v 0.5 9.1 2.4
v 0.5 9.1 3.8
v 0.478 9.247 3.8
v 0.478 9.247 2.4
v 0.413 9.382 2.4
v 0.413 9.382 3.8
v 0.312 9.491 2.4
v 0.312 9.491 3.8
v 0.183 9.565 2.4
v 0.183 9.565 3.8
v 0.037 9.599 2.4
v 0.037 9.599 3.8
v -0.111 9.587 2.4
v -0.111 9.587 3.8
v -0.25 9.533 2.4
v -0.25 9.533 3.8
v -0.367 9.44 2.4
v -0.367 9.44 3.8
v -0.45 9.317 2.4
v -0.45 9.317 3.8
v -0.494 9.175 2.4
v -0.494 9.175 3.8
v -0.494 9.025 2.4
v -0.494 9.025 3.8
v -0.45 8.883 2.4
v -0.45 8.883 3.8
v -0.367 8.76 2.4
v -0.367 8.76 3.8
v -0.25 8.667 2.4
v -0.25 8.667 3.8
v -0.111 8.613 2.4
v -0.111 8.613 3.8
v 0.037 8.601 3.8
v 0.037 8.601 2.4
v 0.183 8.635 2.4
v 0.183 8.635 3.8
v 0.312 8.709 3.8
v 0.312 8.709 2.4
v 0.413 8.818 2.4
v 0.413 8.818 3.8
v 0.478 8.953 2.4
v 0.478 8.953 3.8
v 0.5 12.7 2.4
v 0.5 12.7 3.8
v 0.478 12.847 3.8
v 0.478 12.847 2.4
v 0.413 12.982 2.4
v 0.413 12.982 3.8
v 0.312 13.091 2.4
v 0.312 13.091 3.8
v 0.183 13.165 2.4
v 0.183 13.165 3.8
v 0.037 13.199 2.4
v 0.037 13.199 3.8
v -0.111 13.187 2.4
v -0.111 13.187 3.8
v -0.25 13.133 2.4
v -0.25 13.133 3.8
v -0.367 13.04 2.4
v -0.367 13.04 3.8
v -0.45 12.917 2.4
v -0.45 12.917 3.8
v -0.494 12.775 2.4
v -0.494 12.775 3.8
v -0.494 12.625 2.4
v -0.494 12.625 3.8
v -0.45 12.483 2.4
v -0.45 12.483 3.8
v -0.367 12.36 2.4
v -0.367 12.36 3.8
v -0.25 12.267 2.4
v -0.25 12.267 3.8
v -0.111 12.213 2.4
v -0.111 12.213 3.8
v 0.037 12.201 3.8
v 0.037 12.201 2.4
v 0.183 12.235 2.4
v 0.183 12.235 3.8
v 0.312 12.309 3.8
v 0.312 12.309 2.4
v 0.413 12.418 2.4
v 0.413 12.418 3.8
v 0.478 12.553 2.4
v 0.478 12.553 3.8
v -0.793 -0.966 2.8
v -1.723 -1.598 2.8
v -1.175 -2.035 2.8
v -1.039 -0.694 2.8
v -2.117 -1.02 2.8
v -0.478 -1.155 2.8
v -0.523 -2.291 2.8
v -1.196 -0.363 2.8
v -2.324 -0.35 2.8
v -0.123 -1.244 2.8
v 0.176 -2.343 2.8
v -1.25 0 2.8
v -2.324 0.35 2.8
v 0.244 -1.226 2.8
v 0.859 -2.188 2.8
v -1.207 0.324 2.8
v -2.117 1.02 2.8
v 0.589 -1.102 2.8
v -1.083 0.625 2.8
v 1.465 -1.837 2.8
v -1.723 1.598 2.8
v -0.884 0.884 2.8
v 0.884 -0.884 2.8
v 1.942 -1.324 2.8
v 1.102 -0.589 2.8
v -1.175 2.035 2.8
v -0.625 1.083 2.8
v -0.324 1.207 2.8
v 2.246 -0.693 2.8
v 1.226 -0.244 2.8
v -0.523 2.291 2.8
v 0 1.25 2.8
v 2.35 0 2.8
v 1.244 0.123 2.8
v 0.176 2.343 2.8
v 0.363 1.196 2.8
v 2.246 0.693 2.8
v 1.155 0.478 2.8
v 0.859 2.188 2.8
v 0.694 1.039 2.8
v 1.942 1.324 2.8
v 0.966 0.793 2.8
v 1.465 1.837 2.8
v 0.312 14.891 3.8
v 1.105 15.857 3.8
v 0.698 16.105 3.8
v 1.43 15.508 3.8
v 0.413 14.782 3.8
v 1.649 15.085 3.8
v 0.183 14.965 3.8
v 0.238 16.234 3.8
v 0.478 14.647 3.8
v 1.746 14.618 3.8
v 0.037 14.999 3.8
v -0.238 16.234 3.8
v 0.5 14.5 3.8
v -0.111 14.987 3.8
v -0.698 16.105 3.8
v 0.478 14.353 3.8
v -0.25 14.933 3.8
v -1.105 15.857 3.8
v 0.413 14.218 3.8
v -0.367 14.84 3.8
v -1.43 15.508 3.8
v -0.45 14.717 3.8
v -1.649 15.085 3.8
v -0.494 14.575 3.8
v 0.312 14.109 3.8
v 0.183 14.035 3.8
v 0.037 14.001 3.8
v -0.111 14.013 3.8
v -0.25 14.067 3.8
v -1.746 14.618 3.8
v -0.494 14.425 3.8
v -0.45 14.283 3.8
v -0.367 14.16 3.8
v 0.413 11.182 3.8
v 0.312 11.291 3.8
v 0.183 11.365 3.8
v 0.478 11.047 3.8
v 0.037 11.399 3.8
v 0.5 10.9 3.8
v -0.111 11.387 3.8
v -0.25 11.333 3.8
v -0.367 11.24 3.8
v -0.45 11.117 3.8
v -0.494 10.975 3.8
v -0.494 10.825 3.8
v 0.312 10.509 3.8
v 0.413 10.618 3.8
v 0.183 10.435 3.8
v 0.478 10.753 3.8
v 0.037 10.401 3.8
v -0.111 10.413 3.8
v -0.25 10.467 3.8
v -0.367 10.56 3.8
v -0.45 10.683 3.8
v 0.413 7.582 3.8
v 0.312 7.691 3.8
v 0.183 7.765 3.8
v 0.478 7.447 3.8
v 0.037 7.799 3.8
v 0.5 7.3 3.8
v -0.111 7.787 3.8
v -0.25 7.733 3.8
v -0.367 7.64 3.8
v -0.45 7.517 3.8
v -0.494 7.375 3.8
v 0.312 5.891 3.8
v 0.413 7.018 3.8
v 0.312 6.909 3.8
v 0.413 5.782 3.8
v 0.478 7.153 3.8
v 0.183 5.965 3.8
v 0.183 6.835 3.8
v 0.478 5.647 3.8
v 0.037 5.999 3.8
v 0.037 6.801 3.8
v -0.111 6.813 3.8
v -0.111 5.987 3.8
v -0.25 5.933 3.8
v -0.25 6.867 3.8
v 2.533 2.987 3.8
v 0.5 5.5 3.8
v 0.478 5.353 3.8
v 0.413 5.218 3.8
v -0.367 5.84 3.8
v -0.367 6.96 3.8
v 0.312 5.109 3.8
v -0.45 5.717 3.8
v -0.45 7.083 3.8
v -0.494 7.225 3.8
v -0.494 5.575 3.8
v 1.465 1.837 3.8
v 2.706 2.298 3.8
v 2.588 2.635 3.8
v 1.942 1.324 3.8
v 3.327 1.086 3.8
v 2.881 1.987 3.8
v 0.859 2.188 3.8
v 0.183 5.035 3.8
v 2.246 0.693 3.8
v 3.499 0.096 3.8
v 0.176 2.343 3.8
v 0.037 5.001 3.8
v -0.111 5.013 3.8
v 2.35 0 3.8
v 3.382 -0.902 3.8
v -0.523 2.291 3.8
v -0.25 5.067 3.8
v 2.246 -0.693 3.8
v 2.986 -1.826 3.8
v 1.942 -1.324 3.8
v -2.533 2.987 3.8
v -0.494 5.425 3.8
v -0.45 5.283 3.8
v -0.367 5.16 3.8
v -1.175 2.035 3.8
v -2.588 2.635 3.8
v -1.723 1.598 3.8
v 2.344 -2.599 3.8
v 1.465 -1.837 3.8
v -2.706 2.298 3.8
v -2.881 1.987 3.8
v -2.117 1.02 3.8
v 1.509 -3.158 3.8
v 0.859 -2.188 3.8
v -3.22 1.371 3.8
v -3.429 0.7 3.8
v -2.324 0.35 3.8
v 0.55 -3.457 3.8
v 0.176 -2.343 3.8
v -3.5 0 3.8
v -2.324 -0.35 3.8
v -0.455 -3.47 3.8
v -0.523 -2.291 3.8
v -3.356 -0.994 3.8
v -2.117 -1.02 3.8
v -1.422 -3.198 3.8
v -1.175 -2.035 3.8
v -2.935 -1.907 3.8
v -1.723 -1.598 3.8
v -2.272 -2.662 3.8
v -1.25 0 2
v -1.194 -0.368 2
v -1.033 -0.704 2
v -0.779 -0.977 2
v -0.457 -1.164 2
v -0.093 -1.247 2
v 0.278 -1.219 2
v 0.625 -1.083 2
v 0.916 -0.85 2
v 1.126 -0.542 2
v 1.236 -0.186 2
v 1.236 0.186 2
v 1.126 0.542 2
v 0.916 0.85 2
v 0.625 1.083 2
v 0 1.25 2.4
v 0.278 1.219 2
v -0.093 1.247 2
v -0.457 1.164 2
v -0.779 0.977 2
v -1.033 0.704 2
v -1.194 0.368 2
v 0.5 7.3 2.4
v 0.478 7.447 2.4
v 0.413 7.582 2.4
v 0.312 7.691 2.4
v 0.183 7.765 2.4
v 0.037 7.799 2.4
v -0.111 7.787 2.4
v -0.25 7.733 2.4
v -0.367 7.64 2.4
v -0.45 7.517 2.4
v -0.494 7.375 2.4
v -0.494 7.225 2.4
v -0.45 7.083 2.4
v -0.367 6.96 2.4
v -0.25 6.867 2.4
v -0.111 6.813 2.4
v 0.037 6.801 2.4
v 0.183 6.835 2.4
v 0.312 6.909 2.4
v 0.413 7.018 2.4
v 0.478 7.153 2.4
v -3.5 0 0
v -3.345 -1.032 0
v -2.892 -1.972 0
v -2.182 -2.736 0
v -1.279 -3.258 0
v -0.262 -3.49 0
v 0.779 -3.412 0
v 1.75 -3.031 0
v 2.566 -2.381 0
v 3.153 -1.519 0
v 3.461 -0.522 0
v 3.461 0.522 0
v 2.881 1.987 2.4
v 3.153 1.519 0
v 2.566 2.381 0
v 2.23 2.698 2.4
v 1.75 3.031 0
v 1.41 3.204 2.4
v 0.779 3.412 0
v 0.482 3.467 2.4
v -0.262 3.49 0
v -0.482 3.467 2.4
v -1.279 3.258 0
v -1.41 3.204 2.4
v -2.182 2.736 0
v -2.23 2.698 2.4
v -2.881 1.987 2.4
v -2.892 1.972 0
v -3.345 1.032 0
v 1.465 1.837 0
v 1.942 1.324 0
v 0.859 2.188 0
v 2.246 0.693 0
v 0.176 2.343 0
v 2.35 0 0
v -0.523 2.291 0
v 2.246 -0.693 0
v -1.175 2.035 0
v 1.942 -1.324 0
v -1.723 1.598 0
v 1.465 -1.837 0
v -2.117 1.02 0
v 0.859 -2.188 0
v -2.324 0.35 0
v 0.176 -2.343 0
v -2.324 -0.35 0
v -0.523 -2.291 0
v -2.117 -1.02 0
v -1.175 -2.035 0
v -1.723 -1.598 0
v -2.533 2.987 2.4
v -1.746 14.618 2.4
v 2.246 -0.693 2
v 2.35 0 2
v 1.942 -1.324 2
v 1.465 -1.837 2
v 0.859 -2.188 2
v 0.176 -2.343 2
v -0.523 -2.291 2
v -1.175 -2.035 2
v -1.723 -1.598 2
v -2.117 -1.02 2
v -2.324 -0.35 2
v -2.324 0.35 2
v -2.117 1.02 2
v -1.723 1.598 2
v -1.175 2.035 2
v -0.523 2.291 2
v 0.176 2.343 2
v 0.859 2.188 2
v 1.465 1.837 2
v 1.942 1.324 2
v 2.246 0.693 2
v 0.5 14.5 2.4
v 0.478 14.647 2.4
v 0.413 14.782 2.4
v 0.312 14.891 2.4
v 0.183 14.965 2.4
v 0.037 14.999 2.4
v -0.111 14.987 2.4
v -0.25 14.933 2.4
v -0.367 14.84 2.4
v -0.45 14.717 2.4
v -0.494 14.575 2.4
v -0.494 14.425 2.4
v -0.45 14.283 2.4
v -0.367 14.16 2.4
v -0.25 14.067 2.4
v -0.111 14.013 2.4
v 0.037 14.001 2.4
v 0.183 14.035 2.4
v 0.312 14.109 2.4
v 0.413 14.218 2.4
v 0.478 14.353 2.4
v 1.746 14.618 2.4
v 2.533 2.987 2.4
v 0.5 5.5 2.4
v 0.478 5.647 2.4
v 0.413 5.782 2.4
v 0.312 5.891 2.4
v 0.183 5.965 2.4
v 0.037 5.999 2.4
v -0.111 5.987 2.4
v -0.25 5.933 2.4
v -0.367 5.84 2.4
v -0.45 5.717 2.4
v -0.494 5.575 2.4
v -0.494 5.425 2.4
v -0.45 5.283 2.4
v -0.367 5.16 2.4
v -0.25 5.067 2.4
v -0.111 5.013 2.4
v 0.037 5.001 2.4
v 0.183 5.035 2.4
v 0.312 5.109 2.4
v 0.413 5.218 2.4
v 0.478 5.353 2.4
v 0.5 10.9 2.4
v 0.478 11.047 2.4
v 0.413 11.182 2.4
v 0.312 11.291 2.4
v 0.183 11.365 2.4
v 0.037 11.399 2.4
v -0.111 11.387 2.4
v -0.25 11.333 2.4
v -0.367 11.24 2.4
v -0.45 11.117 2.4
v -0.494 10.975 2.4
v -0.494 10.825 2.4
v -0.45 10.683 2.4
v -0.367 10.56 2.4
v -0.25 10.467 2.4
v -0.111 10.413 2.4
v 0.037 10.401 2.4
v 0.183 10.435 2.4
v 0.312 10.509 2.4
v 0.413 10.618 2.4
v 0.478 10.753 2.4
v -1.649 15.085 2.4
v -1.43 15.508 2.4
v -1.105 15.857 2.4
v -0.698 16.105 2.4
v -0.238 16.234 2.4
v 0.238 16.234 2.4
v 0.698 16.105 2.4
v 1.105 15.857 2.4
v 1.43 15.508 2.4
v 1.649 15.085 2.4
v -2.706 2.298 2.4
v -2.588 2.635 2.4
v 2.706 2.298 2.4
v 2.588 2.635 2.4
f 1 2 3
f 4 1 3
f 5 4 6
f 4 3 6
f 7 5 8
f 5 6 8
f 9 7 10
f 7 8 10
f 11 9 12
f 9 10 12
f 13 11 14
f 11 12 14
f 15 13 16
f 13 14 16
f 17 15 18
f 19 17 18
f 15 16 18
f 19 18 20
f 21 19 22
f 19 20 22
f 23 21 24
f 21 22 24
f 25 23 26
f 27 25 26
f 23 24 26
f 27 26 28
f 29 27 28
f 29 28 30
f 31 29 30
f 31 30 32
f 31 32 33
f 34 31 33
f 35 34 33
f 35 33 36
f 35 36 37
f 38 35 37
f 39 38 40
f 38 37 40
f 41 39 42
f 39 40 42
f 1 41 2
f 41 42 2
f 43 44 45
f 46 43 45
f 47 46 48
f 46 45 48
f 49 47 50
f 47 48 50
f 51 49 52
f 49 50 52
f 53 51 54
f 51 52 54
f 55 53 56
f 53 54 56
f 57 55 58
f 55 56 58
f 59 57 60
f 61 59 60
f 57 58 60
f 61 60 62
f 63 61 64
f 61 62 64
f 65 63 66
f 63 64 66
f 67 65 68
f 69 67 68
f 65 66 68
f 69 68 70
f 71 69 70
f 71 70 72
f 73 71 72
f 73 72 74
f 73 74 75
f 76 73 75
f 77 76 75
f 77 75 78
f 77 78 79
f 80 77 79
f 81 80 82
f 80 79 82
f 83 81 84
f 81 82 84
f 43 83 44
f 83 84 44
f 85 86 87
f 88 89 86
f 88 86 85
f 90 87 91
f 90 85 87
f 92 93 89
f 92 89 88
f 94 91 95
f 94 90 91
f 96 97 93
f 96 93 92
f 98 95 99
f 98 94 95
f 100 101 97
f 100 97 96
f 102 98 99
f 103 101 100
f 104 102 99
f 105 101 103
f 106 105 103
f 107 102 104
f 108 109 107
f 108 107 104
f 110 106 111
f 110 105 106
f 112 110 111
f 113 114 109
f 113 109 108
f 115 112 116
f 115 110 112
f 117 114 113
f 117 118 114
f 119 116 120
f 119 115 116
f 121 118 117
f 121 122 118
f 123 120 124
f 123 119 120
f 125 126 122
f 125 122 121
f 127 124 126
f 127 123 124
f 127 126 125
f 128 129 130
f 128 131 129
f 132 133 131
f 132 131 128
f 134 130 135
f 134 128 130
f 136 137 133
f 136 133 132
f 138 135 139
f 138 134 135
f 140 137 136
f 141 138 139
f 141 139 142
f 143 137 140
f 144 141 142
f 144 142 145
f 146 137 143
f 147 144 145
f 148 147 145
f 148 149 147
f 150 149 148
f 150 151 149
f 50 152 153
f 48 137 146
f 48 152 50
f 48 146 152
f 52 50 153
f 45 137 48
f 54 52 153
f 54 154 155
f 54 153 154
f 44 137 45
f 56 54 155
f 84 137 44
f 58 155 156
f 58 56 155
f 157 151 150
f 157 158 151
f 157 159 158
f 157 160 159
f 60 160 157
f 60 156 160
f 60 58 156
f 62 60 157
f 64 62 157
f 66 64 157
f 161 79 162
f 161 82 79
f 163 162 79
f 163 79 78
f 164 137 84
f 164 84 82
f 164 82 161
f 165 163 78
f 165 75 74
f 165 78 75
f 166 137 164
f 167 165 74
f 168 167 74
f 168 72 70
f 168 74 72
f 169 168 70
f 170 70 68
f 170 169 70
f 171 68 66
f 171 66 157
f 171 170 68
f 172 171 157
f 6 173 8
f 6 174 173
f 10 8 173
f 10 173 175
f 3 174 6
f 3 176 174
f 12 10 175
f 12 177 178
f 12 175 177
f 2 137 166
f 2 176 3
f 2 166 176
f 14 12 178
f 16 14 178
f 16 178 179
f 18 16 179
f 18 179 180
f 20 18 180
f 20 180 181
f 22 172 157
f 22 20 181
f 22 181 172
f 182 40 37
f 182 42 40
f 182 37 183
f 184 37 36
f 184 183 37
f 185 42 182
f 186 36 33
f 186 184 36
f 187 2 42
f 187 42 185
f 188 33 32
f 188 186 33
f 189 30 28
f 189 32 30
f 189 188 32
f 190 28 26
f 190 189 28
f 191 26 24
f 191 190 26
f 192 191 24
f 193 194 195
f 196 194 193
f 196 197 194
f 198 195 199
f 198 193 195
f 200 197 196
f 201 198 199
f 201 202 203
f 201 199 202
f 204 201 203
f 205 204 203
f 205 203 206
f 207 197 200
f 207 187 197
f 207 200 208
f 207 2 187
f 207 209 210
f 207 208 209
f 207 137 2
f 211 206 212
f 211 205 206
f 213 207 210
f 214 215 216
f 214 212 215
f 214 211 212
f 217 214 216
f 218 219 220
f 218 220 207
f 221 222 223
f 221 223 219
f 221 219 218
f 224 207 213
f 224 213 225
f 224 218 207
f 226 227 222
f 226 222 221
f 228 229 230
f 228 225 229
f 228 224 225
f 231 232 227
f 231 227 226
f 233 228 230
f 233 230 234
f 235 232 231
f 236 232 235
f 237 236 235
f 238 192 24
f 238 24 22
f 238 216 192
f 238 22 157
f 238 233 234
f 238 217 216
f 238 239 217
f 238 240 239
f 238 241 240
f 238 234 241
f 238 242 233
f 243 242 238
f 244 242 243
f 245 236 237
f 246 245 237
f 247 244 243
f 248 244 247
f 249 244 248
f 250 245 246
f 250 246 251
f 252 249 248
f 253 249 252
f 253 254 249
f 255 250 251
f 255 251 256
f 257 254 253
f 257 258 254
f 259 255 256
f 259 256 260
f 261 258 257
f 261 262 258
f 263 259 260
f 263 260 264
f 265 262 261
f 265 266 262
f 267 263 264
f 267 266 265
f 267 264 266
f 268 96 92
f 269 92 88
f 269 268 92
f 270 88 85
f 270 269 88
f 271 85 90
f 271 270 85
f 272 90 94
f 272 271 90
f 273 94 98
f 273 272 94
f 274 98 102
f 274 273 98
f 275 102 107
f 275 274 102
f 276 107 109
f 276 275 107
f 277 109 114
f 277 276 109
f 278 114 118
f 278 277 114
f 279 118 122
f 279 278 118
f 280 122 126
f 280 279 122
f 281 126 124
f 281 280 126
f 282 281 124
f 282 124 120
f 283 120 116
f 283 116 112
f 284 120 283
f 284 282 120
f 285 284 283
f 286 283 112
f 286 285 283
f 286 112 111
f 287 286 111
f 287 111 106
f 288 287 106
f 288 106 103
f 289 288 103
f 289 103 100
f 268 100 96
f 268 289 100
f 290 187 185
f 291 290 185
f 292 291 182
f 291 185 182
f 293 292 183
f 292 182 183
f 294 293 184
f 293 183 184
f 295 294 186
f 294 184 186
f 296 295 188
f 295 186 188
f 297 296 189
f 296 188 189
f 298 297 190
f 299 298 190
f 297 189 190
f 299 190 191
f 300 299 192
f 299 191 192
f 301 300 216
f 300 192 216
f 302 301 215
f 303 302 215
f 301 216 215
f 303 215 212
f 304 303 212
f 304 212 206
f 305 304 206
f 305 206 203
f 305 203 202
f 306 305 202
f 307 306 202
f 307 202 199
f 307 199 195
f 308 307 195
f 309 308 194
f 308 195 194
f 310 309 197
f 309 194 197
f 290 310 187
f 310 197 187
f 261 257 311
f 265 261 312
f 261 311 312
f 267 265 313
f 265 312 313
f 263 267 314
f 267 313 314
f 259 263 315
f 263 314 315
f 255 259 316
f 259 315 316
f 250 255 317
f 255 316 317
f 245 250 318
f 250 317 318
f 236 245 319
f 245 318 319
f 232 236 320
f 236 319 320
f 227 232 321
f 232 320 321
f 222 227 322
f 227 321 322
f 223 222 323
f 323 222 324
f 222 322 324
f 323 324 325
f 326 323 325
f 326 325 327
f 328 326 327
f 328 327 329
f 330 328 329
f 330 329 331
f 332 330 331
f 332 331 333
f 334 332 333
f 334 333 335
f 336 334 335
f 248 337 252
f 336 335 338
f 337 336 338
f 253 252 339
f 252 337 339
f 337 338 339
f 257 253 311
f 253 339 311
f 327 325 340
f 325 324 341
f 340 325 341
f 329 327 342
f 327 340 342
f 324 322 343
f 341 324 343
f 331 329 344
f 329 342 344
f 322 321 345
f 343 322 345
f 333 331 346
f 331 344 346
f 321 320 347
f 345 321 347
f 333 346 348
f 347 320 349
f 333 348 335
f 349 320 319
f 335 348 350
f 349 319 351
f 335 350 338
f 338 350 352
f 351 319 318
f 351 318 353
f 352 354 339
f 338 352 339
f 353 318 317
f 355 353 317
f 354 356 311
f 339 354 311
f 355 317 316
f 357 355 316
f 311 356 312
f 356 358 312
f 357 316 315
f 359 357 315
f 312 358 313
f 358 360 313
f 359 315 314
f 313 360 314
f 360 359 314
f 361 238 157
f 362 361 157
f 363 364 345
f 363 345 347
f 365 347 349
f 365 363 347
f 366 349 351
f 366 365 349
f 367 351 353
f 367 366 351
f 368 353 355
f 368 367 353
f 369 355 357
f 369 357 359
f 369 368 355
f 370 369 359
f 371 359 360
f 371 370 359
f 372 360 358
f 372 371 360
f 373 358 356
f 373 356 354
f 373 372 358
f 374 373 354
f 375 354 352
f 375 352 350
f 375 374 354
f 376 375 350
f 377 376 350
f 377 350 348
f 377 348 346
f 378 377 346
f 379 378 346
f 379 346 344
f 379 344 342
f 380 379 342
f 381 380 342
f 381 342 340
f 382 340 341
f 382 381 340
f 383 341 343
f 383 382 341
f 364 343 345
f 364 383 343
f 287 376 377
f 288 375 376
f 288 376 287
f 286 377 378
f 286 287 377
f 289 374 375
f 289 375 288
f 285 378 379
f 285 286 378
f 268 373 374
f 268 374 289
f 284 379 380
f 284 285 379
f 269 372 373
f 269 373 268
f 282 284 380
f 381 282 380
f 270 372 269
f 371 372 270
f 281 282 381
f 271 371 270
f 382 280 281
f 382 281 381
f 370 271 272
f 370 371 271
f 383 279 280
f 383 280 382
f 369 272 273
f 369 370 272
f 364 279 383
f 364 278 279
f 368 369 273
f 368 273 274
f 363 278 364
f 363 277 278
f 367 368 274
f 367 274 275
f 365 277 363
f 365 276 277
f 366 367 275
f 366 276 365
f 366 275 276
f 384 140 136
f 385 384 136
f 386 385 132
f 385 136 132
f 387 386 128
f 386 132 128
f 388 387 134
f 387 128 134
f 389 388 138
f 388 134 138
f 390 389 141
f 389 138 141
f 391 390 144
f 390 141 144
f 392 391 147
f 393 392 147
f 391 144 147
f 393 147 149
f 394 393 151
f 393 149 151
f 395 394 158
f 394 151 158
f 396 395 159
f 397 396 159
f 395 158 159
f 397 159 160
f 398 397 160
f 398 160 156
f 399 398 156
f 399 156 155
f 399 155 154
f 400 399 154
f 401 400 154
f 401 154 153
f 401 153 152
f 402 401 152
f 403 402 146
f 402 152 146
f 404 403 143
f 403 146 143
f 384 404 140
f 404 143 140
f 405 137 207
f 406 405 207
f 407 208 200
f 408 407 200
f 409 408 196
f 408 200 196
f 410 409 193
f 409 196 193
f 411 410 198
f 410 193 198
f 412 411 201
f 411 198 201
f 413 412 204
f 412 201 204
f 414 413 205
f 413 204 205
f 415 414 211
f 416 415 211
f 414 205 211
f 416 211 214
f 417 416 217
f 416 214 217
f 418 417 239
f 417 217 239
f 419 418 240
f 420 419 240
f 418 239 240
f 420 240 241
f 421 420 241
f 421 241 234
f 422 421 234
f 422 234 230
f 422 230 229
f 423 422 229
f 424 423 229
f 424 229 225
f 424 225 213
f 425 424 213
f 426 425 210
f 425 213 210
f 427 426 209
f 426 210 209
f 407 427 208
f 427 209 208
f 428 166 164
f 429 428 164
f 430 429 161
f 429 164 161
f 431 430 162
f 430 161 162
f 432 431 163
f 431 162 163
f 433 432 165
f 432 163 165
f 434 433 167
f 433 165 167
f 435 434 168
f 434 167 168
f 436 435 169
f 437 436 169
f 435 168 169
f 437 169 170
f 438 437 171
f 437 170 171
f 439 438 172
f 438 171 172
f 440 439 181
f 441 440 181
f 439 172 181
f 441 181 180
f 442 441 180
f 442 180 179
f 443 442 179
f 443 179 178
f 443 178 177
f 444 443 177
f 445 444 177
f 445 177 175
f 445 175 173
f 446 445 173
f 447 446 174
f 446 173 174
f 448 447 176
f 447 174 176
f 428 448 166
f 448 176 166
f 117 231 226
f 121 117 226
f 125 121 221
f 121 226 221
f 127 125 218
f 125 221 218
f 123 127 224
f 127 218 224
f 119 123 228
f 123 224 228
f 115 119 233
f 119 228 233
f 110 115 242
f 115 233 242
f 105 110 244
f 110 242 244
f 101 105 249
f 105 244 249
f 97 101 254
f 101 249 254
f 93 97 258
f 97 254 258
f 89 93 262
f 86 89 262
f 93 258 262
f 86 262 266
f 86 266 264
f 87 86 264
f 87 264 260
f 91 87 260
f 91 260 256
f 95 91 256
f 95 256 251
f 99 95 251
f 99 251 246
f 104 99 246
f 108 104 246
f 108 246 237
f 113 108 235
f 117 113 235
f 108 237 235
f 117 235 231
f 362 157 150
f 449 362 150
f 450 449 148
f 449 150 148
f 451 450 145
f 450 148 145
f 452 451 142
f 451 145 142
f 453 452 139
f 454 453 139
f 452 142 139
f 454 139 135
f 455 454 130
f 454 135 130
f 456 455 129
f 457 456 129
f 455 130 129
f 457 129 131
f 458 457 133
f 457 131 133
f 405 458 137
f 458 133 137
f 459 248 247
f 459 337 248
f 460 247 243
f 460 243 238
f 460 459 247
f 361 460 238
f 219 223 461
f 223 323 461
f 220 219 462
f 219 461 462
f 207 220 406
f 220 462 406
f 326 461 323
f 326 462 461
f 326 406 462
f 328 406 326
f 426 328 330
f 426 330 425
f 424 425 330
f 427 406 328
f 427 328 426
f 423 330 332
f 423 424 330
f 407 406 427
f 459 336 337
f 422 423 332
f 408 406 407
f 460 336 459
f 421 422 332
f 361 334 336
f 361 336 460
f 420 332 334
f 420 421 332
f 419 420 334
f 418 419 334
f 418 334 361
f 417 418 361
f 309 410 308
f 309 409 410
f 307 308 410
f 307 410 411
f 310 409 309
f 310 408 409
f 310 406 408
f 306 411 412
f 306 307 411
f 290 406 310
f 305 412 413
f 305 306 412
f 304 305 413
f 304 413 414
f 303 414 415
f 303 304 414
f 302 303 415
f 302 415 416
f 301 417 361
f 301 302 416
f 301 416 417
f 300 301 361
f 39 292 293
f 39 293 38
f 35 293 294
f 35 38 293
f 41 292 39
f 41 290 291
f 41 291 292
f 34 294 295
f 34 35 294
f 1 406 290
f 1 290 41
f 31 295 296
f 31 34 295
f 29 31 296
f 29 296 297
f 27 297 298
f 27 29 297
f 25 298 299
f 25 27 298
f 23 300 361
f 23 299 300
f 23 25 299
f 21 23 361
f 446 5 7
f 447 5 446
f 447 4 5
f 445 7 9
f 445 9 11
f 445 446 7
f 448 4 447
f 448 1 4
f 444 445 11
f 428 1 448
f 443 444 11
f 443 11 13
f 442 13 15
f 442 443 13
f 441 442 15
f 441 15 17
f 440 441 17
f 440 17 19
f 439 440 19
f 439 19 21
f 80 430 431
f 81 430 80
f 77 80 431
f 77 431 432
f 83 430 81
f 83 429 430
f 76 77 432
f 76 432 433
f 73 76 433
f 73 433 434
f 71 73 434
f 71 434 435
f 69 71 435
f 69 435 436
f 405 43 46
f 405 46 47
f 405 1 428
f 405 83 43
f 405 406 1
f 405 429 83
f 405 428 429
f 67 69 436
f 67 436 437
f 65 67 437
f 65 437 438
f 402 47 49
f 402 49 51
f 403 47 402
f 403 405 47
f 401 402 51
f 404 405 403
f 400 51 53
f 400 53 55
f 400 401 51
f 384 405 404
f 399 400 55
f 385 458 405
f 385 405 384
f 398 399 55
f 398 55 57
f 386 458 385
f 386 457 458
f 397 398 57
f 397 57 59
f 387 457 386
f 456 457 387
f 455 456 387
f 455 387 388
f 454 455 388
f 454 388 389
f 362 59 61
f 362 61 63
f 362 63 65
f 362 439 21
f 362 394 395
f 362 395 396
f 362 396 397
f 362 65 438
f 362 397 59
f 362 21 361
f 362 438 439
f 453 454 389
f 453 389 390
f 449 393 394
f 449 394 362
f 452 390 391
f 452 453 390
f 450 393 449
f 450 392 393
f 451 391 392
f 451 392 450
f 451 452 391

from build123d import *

# Parameters (mm, degrees)
SKIZZE1_R                       = 3.5
SKIZZE1_R_2                     = 1.25
AUFSATZ_LINEAR_AUSTRAGEN1_DEPTH = 3.8
SKIZZE2_R                       = 0.5
AUFSATZ_LINEAR_AUSTRAGEN2_DEPTH = 1.4
SKIZZE3_R                       = 2.35
SCHNITT_LINEAR_AUSTRAGEN1_DEPTH = 1
SCHNITT_LINEAR_START            = -2
SKIZZE4_R                       = 2.35
SCHNITT_LINEAR_AUSTRAGEN2_DEPTH = 2
VERRUNDUNG1_R                   = 2


with BuildPart() as part:
    # Skizze1 → Aufsatz-Linear austragen1 (new body)
    with BuildSketch(Plane.XY):
        with Locations(Location((0, 0, 0), (0, 0, 180))):
            Circle(SKIZZE1_R)
        with Locations(Location((0, 0, 0), (0, 0, 180))):
            Circle(SKIZZE1_R_2, mode=Mode.SUBTRACT)
    extrude(amount=AUFSATZ_LINEAR_AUSTRAGEN1_DEPTH)

    # Skizze2 → Aufsatz-Linear austragen2 (add)
    with BuildSketch(Plane.XY.offset(3.8)):
        with BuildLine():
            Line((2.65, 1.25), (-2.65, 1.25))
            Line((-2.65, 1.25), (-1.746012422, 14.618070409))
            ThreePointArc((-1.746012422, 14.618070409), (0, 16.25), (1.746012422, 14.618070409))
            Line((1.746012422, 14.618070409), (2.65, 1.25))
        make_face()
        with Locations((0, 14.5)):
            Circle(SKIZZE2_R, mode=Mode.SUBTRACT)
        with Locations((0, 12.7)):
            Circle(SKIZZE2_R, mode=Mode.SUBTRACT)
        with Locations((0, 10.9)):
            Circle(SKIZZE2_R, mode=Mode.SUBTRACT)
        with Locations((0, 9.1)):
            Circle(SKIZZE2_R, mode=Mode.SUBTRACT)
        with Locations((0, 7.3)):
            Circle(SKIZZE2_R, mode=Mode.SUBTRACT)
        with Locations((0, 5.5)):
            Circle(SKIZZE2_R, mode=Mode.SUBTRACT)
    extrude(amount=-AUFSATZ_LINEAR_AUSTRAGEN2_DEPTH)

    # Skizze3 → Schnitt-Linear austragen1 (cut)
    with BuildSketch(Plane.XY.offset(3.8)):
        Circle(SKIZZE3_R)
    extrude(amount=-SCHNITT_LINEAR_AUSTRAGEN1_DEPTH, mode=Mode.SUBTRACT)

    # Skizze4 → Schnitt-Linear austragen2 (cut)
    with BuildSketch(Plane(origin=(0, 0, 0), x_dir=(-1, 0, 0), z_dir=(0, 0, -1)).offset(SCHNITT_LINEAR_START)):
        with Locations(Location((0, 0, 0), (0, 0, 180))):
            Circle(SKIZZE4_R)
    extrude(amount=SCHNITT_LINEAR_AUSTRAGEN2_DEPTH, mode=Mode.SUBTRACT)

    # Verrundung1
    verrundung1_edges = [part.edges().sort_by_distance(p)[0] for p in [
        (-2.5741658, 2.371427931, 3.1),
        (2.5741658, 2.371427931, 3.1),
    ]]
    fillet(verrundung1_edges, radius=VERRUNDUNG1_R)


solid = part.part
